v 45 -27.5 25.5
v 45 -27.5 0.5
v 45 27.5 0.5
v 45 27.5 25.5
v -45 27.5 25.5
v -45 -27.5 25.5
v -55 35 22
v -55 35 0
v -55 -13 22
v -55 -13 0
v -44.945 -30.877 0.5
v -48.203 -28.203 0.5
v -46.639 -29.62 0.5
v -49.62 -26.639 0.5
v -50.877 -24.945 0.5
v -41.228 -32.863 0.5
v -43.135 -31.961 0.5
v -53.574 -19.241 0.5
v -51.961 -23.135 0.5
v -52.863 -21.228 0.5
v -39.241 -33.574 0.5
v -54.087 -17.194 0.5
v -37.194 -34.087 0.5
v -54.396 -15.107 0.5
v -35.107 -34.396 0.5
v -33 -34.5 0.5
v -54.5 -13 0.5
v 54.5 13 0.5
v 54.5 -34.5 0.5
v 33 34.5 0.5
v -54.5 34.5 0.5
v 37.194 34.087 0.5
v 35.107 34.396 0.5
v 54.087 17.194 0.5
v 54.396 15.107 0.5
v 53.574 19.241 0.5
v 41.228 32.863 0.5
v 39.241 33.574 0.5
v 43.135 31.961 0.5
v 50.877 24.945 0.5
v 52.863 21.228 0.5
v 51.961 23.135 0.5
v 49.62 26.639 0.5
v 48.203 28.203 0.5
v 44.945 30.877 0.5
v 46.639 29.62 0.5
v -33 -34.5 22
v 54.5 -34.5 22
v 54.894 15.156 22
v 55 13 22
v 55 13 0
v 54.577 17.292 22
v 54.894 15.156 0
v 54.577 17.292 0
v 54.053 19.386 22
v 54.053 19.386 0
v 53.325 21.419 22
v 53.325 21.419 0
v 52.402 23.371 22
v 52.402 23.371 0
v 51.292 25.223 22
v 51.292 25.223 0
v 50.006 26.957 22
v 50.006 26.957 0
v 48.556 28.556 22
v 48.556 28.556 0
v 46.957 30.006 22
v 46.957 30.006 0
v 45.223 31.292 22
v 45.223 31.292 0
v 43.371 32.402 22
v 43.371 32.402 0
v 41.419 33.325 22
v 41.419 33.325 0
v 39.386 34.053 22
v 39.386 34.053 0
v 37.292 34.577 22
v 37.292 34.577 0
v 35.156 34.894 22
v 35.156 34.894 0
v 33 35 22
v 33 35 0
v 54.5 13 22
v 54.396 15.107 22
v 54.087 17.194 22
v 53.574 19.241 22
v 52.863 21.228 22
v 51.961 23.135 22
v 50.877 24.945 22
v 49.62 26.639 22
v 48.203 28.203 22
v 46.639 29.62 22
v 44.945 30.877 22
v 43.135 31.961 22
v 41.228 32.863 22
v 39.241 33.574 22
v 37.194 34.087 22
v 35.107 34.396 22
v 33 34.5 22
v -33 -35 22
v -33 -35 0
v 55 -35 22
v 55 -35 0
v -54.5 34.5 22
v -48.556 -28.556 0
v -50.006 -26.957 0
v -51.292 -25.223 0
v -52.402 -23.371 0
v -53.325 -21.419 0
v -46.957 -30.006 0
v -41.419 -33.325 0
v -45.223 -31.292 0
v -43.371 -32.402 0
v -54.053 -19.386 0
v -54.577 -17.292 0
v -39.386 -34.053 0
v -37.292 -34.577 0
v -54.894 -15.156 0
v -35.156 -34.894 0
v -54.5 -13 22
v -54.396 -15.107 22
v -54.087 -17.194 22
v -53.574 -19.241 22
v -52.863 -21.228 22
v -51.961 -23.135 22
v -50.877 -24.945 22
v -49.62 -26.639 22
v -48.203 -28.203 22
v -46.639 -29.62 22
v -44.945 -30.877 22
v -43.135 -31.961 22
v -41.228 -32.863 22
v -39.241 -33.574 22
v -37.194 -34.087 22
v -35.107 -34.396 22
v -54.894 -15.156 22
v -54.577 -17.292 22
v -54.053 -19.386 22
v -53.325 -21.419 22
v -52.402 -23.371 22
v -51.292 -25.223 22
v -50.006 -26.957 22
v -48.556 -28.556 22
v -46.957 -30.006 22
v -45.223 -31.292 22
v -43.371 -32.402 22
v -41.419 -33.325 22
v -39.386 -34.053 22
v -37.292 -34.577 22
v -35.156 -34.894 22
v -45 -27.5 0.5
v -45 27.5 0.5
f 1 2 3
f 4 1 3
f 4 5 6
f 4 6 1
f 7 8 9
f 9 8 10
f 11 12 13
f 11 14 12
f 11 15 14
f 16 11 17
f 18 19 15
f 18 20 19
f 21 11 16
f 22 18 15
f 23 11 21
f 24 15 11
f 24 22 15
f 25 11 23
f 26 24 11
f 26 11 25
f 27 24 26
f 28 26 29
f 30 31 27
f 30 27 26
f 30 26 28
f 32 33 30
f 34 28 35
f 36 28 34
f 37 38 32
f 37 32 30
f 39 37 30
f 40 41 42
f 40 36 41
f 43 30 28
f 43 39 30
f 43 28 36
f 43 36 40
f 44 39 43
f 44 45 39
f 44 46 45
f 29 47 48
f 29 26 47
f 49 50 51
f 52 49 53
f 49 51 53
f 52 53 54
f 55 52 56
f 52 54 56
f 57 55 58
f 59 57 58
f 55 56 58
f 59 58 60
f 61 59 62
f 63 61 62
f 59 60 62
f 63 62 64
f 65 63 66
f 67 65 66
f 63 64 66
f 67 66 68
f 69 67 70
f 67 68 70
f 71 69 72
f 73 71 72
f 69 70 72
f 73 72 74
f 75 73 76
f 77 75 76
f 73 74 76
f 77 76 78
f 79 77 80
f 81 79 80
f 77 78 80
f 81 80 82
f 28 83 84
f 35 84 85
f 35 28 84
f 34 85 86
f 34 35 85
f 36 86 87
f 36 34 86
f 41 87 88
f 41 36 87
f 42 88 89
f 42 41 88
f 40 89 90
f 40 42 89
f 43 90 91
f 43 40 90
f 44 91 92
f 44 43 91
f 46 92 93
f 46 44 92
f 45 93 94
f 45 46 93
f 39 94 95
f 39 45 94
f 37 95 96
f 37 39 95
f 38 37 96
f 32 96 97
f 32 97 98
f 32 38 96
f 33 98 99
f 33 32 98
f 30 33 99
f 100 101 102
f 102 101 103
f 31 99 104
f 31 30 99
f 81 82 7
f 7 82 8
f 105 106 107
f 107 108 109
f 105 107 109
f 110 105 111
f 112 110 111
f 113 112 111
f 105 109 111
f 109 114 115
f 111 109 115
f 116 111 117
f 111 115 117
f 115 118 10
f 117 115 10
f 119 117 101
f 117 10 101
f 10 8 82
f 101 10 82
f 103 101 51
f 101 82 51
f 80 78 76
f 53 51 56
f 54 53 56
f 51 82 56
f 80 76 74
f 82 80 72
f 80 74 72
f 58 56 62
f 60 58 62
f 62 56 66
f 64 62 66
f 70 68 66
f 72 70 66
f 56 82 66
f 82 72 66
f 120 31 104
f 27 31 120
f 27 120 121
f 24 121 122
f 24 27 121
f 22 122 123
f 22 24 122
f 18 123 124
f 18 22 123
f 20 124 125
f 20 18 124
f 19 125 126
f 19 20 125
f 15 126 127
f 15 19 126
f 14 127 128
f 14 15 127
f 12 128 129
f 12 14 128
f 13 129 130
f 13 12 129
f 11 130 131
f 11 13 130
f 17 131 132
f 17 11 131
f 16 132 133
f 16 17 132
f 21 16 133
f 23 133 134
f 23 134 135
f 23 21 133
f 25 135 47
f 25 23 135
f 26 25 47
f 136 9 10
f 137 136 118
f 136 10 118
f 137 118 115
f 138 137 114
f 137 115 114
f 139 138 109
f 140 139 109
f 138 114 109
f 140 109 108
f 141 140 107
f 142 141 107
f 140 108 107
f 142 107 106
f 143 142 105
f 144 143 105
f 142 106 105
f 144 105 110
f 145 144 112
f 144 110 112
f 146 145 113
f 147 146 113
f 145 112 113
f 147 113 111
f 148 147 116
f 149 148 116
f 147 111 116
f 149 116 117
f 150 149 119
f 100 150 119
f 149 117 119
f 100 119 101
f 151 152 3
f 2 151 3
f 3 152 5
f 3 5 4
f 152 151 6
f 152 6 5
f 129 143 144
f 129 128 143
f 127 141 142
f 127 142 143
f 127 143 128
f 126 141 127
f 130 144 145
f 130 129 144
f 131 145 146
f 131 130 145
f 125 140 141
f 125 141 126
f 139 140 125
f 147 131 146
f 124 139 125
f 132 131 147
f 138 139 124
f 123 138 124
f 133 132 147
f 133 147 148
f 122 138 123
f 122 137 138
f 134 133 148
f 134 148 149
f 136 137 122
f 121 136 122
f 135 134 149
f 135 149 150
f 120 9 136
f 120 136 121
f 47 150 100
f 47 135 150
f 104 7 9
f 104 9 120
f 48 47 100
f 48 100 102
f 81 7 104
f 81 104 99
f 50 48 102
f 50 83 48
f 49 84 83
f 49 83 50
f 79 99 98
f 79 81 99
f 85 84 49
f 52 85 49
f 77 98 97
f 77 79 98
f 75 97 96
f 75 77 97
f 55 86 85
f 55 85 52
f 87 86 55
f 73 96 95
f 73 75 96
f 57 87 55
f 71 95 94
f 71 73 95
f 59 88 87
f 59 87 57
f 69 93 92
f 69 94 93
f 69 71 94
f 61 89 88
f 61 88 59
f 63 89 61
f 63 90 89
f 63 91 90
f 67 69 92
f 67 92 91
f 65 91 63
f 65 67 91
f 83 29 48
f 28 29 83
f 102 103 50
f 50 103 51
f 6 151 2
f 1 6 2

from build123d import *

# Parameters (mm, degrees)
F1_DEPTH = 22
F2_T     = -0.5
F3_W     = 90
F3_H     = 55
F4_DEPTH = 25


with BuildPart() as f1:
    # F0 (on Top) → F1 (new body)
    with BuildSketch(Plane.XY):
        with BuildLine():
            ThreePointArc((55, 13), (48.556349, 28.556349), (33, 35))
            Line((33, 35), (-55, 35))
            Line((-55, 35), (-55, -13))
            ThreePointArc((-55, -13), (-48.556349, -28.556349), (-33, -35))
            Line((-33, -35), (55, -35))
            Line((55, -35), (55, 13))
        make_face()
    extrude(amount=F1_DEPTH)

    # F2
    f2_openings = [f1.faces().sort_by_distance(p)[0] for p in [
        (0, 0, 22),
    ]]
    offset(amount=F2_T, openings=f2_openings)


with BuildPart() as f4:
    # F3 (on face) → F4 (new body)
    with BuildSketch(Plane.XY.offset(0.5)):
        Rectangle(F3_W, F3_H)
    extrude(amount=F4_DEPTH)


solid = Compound([f1.part, f4.part])
